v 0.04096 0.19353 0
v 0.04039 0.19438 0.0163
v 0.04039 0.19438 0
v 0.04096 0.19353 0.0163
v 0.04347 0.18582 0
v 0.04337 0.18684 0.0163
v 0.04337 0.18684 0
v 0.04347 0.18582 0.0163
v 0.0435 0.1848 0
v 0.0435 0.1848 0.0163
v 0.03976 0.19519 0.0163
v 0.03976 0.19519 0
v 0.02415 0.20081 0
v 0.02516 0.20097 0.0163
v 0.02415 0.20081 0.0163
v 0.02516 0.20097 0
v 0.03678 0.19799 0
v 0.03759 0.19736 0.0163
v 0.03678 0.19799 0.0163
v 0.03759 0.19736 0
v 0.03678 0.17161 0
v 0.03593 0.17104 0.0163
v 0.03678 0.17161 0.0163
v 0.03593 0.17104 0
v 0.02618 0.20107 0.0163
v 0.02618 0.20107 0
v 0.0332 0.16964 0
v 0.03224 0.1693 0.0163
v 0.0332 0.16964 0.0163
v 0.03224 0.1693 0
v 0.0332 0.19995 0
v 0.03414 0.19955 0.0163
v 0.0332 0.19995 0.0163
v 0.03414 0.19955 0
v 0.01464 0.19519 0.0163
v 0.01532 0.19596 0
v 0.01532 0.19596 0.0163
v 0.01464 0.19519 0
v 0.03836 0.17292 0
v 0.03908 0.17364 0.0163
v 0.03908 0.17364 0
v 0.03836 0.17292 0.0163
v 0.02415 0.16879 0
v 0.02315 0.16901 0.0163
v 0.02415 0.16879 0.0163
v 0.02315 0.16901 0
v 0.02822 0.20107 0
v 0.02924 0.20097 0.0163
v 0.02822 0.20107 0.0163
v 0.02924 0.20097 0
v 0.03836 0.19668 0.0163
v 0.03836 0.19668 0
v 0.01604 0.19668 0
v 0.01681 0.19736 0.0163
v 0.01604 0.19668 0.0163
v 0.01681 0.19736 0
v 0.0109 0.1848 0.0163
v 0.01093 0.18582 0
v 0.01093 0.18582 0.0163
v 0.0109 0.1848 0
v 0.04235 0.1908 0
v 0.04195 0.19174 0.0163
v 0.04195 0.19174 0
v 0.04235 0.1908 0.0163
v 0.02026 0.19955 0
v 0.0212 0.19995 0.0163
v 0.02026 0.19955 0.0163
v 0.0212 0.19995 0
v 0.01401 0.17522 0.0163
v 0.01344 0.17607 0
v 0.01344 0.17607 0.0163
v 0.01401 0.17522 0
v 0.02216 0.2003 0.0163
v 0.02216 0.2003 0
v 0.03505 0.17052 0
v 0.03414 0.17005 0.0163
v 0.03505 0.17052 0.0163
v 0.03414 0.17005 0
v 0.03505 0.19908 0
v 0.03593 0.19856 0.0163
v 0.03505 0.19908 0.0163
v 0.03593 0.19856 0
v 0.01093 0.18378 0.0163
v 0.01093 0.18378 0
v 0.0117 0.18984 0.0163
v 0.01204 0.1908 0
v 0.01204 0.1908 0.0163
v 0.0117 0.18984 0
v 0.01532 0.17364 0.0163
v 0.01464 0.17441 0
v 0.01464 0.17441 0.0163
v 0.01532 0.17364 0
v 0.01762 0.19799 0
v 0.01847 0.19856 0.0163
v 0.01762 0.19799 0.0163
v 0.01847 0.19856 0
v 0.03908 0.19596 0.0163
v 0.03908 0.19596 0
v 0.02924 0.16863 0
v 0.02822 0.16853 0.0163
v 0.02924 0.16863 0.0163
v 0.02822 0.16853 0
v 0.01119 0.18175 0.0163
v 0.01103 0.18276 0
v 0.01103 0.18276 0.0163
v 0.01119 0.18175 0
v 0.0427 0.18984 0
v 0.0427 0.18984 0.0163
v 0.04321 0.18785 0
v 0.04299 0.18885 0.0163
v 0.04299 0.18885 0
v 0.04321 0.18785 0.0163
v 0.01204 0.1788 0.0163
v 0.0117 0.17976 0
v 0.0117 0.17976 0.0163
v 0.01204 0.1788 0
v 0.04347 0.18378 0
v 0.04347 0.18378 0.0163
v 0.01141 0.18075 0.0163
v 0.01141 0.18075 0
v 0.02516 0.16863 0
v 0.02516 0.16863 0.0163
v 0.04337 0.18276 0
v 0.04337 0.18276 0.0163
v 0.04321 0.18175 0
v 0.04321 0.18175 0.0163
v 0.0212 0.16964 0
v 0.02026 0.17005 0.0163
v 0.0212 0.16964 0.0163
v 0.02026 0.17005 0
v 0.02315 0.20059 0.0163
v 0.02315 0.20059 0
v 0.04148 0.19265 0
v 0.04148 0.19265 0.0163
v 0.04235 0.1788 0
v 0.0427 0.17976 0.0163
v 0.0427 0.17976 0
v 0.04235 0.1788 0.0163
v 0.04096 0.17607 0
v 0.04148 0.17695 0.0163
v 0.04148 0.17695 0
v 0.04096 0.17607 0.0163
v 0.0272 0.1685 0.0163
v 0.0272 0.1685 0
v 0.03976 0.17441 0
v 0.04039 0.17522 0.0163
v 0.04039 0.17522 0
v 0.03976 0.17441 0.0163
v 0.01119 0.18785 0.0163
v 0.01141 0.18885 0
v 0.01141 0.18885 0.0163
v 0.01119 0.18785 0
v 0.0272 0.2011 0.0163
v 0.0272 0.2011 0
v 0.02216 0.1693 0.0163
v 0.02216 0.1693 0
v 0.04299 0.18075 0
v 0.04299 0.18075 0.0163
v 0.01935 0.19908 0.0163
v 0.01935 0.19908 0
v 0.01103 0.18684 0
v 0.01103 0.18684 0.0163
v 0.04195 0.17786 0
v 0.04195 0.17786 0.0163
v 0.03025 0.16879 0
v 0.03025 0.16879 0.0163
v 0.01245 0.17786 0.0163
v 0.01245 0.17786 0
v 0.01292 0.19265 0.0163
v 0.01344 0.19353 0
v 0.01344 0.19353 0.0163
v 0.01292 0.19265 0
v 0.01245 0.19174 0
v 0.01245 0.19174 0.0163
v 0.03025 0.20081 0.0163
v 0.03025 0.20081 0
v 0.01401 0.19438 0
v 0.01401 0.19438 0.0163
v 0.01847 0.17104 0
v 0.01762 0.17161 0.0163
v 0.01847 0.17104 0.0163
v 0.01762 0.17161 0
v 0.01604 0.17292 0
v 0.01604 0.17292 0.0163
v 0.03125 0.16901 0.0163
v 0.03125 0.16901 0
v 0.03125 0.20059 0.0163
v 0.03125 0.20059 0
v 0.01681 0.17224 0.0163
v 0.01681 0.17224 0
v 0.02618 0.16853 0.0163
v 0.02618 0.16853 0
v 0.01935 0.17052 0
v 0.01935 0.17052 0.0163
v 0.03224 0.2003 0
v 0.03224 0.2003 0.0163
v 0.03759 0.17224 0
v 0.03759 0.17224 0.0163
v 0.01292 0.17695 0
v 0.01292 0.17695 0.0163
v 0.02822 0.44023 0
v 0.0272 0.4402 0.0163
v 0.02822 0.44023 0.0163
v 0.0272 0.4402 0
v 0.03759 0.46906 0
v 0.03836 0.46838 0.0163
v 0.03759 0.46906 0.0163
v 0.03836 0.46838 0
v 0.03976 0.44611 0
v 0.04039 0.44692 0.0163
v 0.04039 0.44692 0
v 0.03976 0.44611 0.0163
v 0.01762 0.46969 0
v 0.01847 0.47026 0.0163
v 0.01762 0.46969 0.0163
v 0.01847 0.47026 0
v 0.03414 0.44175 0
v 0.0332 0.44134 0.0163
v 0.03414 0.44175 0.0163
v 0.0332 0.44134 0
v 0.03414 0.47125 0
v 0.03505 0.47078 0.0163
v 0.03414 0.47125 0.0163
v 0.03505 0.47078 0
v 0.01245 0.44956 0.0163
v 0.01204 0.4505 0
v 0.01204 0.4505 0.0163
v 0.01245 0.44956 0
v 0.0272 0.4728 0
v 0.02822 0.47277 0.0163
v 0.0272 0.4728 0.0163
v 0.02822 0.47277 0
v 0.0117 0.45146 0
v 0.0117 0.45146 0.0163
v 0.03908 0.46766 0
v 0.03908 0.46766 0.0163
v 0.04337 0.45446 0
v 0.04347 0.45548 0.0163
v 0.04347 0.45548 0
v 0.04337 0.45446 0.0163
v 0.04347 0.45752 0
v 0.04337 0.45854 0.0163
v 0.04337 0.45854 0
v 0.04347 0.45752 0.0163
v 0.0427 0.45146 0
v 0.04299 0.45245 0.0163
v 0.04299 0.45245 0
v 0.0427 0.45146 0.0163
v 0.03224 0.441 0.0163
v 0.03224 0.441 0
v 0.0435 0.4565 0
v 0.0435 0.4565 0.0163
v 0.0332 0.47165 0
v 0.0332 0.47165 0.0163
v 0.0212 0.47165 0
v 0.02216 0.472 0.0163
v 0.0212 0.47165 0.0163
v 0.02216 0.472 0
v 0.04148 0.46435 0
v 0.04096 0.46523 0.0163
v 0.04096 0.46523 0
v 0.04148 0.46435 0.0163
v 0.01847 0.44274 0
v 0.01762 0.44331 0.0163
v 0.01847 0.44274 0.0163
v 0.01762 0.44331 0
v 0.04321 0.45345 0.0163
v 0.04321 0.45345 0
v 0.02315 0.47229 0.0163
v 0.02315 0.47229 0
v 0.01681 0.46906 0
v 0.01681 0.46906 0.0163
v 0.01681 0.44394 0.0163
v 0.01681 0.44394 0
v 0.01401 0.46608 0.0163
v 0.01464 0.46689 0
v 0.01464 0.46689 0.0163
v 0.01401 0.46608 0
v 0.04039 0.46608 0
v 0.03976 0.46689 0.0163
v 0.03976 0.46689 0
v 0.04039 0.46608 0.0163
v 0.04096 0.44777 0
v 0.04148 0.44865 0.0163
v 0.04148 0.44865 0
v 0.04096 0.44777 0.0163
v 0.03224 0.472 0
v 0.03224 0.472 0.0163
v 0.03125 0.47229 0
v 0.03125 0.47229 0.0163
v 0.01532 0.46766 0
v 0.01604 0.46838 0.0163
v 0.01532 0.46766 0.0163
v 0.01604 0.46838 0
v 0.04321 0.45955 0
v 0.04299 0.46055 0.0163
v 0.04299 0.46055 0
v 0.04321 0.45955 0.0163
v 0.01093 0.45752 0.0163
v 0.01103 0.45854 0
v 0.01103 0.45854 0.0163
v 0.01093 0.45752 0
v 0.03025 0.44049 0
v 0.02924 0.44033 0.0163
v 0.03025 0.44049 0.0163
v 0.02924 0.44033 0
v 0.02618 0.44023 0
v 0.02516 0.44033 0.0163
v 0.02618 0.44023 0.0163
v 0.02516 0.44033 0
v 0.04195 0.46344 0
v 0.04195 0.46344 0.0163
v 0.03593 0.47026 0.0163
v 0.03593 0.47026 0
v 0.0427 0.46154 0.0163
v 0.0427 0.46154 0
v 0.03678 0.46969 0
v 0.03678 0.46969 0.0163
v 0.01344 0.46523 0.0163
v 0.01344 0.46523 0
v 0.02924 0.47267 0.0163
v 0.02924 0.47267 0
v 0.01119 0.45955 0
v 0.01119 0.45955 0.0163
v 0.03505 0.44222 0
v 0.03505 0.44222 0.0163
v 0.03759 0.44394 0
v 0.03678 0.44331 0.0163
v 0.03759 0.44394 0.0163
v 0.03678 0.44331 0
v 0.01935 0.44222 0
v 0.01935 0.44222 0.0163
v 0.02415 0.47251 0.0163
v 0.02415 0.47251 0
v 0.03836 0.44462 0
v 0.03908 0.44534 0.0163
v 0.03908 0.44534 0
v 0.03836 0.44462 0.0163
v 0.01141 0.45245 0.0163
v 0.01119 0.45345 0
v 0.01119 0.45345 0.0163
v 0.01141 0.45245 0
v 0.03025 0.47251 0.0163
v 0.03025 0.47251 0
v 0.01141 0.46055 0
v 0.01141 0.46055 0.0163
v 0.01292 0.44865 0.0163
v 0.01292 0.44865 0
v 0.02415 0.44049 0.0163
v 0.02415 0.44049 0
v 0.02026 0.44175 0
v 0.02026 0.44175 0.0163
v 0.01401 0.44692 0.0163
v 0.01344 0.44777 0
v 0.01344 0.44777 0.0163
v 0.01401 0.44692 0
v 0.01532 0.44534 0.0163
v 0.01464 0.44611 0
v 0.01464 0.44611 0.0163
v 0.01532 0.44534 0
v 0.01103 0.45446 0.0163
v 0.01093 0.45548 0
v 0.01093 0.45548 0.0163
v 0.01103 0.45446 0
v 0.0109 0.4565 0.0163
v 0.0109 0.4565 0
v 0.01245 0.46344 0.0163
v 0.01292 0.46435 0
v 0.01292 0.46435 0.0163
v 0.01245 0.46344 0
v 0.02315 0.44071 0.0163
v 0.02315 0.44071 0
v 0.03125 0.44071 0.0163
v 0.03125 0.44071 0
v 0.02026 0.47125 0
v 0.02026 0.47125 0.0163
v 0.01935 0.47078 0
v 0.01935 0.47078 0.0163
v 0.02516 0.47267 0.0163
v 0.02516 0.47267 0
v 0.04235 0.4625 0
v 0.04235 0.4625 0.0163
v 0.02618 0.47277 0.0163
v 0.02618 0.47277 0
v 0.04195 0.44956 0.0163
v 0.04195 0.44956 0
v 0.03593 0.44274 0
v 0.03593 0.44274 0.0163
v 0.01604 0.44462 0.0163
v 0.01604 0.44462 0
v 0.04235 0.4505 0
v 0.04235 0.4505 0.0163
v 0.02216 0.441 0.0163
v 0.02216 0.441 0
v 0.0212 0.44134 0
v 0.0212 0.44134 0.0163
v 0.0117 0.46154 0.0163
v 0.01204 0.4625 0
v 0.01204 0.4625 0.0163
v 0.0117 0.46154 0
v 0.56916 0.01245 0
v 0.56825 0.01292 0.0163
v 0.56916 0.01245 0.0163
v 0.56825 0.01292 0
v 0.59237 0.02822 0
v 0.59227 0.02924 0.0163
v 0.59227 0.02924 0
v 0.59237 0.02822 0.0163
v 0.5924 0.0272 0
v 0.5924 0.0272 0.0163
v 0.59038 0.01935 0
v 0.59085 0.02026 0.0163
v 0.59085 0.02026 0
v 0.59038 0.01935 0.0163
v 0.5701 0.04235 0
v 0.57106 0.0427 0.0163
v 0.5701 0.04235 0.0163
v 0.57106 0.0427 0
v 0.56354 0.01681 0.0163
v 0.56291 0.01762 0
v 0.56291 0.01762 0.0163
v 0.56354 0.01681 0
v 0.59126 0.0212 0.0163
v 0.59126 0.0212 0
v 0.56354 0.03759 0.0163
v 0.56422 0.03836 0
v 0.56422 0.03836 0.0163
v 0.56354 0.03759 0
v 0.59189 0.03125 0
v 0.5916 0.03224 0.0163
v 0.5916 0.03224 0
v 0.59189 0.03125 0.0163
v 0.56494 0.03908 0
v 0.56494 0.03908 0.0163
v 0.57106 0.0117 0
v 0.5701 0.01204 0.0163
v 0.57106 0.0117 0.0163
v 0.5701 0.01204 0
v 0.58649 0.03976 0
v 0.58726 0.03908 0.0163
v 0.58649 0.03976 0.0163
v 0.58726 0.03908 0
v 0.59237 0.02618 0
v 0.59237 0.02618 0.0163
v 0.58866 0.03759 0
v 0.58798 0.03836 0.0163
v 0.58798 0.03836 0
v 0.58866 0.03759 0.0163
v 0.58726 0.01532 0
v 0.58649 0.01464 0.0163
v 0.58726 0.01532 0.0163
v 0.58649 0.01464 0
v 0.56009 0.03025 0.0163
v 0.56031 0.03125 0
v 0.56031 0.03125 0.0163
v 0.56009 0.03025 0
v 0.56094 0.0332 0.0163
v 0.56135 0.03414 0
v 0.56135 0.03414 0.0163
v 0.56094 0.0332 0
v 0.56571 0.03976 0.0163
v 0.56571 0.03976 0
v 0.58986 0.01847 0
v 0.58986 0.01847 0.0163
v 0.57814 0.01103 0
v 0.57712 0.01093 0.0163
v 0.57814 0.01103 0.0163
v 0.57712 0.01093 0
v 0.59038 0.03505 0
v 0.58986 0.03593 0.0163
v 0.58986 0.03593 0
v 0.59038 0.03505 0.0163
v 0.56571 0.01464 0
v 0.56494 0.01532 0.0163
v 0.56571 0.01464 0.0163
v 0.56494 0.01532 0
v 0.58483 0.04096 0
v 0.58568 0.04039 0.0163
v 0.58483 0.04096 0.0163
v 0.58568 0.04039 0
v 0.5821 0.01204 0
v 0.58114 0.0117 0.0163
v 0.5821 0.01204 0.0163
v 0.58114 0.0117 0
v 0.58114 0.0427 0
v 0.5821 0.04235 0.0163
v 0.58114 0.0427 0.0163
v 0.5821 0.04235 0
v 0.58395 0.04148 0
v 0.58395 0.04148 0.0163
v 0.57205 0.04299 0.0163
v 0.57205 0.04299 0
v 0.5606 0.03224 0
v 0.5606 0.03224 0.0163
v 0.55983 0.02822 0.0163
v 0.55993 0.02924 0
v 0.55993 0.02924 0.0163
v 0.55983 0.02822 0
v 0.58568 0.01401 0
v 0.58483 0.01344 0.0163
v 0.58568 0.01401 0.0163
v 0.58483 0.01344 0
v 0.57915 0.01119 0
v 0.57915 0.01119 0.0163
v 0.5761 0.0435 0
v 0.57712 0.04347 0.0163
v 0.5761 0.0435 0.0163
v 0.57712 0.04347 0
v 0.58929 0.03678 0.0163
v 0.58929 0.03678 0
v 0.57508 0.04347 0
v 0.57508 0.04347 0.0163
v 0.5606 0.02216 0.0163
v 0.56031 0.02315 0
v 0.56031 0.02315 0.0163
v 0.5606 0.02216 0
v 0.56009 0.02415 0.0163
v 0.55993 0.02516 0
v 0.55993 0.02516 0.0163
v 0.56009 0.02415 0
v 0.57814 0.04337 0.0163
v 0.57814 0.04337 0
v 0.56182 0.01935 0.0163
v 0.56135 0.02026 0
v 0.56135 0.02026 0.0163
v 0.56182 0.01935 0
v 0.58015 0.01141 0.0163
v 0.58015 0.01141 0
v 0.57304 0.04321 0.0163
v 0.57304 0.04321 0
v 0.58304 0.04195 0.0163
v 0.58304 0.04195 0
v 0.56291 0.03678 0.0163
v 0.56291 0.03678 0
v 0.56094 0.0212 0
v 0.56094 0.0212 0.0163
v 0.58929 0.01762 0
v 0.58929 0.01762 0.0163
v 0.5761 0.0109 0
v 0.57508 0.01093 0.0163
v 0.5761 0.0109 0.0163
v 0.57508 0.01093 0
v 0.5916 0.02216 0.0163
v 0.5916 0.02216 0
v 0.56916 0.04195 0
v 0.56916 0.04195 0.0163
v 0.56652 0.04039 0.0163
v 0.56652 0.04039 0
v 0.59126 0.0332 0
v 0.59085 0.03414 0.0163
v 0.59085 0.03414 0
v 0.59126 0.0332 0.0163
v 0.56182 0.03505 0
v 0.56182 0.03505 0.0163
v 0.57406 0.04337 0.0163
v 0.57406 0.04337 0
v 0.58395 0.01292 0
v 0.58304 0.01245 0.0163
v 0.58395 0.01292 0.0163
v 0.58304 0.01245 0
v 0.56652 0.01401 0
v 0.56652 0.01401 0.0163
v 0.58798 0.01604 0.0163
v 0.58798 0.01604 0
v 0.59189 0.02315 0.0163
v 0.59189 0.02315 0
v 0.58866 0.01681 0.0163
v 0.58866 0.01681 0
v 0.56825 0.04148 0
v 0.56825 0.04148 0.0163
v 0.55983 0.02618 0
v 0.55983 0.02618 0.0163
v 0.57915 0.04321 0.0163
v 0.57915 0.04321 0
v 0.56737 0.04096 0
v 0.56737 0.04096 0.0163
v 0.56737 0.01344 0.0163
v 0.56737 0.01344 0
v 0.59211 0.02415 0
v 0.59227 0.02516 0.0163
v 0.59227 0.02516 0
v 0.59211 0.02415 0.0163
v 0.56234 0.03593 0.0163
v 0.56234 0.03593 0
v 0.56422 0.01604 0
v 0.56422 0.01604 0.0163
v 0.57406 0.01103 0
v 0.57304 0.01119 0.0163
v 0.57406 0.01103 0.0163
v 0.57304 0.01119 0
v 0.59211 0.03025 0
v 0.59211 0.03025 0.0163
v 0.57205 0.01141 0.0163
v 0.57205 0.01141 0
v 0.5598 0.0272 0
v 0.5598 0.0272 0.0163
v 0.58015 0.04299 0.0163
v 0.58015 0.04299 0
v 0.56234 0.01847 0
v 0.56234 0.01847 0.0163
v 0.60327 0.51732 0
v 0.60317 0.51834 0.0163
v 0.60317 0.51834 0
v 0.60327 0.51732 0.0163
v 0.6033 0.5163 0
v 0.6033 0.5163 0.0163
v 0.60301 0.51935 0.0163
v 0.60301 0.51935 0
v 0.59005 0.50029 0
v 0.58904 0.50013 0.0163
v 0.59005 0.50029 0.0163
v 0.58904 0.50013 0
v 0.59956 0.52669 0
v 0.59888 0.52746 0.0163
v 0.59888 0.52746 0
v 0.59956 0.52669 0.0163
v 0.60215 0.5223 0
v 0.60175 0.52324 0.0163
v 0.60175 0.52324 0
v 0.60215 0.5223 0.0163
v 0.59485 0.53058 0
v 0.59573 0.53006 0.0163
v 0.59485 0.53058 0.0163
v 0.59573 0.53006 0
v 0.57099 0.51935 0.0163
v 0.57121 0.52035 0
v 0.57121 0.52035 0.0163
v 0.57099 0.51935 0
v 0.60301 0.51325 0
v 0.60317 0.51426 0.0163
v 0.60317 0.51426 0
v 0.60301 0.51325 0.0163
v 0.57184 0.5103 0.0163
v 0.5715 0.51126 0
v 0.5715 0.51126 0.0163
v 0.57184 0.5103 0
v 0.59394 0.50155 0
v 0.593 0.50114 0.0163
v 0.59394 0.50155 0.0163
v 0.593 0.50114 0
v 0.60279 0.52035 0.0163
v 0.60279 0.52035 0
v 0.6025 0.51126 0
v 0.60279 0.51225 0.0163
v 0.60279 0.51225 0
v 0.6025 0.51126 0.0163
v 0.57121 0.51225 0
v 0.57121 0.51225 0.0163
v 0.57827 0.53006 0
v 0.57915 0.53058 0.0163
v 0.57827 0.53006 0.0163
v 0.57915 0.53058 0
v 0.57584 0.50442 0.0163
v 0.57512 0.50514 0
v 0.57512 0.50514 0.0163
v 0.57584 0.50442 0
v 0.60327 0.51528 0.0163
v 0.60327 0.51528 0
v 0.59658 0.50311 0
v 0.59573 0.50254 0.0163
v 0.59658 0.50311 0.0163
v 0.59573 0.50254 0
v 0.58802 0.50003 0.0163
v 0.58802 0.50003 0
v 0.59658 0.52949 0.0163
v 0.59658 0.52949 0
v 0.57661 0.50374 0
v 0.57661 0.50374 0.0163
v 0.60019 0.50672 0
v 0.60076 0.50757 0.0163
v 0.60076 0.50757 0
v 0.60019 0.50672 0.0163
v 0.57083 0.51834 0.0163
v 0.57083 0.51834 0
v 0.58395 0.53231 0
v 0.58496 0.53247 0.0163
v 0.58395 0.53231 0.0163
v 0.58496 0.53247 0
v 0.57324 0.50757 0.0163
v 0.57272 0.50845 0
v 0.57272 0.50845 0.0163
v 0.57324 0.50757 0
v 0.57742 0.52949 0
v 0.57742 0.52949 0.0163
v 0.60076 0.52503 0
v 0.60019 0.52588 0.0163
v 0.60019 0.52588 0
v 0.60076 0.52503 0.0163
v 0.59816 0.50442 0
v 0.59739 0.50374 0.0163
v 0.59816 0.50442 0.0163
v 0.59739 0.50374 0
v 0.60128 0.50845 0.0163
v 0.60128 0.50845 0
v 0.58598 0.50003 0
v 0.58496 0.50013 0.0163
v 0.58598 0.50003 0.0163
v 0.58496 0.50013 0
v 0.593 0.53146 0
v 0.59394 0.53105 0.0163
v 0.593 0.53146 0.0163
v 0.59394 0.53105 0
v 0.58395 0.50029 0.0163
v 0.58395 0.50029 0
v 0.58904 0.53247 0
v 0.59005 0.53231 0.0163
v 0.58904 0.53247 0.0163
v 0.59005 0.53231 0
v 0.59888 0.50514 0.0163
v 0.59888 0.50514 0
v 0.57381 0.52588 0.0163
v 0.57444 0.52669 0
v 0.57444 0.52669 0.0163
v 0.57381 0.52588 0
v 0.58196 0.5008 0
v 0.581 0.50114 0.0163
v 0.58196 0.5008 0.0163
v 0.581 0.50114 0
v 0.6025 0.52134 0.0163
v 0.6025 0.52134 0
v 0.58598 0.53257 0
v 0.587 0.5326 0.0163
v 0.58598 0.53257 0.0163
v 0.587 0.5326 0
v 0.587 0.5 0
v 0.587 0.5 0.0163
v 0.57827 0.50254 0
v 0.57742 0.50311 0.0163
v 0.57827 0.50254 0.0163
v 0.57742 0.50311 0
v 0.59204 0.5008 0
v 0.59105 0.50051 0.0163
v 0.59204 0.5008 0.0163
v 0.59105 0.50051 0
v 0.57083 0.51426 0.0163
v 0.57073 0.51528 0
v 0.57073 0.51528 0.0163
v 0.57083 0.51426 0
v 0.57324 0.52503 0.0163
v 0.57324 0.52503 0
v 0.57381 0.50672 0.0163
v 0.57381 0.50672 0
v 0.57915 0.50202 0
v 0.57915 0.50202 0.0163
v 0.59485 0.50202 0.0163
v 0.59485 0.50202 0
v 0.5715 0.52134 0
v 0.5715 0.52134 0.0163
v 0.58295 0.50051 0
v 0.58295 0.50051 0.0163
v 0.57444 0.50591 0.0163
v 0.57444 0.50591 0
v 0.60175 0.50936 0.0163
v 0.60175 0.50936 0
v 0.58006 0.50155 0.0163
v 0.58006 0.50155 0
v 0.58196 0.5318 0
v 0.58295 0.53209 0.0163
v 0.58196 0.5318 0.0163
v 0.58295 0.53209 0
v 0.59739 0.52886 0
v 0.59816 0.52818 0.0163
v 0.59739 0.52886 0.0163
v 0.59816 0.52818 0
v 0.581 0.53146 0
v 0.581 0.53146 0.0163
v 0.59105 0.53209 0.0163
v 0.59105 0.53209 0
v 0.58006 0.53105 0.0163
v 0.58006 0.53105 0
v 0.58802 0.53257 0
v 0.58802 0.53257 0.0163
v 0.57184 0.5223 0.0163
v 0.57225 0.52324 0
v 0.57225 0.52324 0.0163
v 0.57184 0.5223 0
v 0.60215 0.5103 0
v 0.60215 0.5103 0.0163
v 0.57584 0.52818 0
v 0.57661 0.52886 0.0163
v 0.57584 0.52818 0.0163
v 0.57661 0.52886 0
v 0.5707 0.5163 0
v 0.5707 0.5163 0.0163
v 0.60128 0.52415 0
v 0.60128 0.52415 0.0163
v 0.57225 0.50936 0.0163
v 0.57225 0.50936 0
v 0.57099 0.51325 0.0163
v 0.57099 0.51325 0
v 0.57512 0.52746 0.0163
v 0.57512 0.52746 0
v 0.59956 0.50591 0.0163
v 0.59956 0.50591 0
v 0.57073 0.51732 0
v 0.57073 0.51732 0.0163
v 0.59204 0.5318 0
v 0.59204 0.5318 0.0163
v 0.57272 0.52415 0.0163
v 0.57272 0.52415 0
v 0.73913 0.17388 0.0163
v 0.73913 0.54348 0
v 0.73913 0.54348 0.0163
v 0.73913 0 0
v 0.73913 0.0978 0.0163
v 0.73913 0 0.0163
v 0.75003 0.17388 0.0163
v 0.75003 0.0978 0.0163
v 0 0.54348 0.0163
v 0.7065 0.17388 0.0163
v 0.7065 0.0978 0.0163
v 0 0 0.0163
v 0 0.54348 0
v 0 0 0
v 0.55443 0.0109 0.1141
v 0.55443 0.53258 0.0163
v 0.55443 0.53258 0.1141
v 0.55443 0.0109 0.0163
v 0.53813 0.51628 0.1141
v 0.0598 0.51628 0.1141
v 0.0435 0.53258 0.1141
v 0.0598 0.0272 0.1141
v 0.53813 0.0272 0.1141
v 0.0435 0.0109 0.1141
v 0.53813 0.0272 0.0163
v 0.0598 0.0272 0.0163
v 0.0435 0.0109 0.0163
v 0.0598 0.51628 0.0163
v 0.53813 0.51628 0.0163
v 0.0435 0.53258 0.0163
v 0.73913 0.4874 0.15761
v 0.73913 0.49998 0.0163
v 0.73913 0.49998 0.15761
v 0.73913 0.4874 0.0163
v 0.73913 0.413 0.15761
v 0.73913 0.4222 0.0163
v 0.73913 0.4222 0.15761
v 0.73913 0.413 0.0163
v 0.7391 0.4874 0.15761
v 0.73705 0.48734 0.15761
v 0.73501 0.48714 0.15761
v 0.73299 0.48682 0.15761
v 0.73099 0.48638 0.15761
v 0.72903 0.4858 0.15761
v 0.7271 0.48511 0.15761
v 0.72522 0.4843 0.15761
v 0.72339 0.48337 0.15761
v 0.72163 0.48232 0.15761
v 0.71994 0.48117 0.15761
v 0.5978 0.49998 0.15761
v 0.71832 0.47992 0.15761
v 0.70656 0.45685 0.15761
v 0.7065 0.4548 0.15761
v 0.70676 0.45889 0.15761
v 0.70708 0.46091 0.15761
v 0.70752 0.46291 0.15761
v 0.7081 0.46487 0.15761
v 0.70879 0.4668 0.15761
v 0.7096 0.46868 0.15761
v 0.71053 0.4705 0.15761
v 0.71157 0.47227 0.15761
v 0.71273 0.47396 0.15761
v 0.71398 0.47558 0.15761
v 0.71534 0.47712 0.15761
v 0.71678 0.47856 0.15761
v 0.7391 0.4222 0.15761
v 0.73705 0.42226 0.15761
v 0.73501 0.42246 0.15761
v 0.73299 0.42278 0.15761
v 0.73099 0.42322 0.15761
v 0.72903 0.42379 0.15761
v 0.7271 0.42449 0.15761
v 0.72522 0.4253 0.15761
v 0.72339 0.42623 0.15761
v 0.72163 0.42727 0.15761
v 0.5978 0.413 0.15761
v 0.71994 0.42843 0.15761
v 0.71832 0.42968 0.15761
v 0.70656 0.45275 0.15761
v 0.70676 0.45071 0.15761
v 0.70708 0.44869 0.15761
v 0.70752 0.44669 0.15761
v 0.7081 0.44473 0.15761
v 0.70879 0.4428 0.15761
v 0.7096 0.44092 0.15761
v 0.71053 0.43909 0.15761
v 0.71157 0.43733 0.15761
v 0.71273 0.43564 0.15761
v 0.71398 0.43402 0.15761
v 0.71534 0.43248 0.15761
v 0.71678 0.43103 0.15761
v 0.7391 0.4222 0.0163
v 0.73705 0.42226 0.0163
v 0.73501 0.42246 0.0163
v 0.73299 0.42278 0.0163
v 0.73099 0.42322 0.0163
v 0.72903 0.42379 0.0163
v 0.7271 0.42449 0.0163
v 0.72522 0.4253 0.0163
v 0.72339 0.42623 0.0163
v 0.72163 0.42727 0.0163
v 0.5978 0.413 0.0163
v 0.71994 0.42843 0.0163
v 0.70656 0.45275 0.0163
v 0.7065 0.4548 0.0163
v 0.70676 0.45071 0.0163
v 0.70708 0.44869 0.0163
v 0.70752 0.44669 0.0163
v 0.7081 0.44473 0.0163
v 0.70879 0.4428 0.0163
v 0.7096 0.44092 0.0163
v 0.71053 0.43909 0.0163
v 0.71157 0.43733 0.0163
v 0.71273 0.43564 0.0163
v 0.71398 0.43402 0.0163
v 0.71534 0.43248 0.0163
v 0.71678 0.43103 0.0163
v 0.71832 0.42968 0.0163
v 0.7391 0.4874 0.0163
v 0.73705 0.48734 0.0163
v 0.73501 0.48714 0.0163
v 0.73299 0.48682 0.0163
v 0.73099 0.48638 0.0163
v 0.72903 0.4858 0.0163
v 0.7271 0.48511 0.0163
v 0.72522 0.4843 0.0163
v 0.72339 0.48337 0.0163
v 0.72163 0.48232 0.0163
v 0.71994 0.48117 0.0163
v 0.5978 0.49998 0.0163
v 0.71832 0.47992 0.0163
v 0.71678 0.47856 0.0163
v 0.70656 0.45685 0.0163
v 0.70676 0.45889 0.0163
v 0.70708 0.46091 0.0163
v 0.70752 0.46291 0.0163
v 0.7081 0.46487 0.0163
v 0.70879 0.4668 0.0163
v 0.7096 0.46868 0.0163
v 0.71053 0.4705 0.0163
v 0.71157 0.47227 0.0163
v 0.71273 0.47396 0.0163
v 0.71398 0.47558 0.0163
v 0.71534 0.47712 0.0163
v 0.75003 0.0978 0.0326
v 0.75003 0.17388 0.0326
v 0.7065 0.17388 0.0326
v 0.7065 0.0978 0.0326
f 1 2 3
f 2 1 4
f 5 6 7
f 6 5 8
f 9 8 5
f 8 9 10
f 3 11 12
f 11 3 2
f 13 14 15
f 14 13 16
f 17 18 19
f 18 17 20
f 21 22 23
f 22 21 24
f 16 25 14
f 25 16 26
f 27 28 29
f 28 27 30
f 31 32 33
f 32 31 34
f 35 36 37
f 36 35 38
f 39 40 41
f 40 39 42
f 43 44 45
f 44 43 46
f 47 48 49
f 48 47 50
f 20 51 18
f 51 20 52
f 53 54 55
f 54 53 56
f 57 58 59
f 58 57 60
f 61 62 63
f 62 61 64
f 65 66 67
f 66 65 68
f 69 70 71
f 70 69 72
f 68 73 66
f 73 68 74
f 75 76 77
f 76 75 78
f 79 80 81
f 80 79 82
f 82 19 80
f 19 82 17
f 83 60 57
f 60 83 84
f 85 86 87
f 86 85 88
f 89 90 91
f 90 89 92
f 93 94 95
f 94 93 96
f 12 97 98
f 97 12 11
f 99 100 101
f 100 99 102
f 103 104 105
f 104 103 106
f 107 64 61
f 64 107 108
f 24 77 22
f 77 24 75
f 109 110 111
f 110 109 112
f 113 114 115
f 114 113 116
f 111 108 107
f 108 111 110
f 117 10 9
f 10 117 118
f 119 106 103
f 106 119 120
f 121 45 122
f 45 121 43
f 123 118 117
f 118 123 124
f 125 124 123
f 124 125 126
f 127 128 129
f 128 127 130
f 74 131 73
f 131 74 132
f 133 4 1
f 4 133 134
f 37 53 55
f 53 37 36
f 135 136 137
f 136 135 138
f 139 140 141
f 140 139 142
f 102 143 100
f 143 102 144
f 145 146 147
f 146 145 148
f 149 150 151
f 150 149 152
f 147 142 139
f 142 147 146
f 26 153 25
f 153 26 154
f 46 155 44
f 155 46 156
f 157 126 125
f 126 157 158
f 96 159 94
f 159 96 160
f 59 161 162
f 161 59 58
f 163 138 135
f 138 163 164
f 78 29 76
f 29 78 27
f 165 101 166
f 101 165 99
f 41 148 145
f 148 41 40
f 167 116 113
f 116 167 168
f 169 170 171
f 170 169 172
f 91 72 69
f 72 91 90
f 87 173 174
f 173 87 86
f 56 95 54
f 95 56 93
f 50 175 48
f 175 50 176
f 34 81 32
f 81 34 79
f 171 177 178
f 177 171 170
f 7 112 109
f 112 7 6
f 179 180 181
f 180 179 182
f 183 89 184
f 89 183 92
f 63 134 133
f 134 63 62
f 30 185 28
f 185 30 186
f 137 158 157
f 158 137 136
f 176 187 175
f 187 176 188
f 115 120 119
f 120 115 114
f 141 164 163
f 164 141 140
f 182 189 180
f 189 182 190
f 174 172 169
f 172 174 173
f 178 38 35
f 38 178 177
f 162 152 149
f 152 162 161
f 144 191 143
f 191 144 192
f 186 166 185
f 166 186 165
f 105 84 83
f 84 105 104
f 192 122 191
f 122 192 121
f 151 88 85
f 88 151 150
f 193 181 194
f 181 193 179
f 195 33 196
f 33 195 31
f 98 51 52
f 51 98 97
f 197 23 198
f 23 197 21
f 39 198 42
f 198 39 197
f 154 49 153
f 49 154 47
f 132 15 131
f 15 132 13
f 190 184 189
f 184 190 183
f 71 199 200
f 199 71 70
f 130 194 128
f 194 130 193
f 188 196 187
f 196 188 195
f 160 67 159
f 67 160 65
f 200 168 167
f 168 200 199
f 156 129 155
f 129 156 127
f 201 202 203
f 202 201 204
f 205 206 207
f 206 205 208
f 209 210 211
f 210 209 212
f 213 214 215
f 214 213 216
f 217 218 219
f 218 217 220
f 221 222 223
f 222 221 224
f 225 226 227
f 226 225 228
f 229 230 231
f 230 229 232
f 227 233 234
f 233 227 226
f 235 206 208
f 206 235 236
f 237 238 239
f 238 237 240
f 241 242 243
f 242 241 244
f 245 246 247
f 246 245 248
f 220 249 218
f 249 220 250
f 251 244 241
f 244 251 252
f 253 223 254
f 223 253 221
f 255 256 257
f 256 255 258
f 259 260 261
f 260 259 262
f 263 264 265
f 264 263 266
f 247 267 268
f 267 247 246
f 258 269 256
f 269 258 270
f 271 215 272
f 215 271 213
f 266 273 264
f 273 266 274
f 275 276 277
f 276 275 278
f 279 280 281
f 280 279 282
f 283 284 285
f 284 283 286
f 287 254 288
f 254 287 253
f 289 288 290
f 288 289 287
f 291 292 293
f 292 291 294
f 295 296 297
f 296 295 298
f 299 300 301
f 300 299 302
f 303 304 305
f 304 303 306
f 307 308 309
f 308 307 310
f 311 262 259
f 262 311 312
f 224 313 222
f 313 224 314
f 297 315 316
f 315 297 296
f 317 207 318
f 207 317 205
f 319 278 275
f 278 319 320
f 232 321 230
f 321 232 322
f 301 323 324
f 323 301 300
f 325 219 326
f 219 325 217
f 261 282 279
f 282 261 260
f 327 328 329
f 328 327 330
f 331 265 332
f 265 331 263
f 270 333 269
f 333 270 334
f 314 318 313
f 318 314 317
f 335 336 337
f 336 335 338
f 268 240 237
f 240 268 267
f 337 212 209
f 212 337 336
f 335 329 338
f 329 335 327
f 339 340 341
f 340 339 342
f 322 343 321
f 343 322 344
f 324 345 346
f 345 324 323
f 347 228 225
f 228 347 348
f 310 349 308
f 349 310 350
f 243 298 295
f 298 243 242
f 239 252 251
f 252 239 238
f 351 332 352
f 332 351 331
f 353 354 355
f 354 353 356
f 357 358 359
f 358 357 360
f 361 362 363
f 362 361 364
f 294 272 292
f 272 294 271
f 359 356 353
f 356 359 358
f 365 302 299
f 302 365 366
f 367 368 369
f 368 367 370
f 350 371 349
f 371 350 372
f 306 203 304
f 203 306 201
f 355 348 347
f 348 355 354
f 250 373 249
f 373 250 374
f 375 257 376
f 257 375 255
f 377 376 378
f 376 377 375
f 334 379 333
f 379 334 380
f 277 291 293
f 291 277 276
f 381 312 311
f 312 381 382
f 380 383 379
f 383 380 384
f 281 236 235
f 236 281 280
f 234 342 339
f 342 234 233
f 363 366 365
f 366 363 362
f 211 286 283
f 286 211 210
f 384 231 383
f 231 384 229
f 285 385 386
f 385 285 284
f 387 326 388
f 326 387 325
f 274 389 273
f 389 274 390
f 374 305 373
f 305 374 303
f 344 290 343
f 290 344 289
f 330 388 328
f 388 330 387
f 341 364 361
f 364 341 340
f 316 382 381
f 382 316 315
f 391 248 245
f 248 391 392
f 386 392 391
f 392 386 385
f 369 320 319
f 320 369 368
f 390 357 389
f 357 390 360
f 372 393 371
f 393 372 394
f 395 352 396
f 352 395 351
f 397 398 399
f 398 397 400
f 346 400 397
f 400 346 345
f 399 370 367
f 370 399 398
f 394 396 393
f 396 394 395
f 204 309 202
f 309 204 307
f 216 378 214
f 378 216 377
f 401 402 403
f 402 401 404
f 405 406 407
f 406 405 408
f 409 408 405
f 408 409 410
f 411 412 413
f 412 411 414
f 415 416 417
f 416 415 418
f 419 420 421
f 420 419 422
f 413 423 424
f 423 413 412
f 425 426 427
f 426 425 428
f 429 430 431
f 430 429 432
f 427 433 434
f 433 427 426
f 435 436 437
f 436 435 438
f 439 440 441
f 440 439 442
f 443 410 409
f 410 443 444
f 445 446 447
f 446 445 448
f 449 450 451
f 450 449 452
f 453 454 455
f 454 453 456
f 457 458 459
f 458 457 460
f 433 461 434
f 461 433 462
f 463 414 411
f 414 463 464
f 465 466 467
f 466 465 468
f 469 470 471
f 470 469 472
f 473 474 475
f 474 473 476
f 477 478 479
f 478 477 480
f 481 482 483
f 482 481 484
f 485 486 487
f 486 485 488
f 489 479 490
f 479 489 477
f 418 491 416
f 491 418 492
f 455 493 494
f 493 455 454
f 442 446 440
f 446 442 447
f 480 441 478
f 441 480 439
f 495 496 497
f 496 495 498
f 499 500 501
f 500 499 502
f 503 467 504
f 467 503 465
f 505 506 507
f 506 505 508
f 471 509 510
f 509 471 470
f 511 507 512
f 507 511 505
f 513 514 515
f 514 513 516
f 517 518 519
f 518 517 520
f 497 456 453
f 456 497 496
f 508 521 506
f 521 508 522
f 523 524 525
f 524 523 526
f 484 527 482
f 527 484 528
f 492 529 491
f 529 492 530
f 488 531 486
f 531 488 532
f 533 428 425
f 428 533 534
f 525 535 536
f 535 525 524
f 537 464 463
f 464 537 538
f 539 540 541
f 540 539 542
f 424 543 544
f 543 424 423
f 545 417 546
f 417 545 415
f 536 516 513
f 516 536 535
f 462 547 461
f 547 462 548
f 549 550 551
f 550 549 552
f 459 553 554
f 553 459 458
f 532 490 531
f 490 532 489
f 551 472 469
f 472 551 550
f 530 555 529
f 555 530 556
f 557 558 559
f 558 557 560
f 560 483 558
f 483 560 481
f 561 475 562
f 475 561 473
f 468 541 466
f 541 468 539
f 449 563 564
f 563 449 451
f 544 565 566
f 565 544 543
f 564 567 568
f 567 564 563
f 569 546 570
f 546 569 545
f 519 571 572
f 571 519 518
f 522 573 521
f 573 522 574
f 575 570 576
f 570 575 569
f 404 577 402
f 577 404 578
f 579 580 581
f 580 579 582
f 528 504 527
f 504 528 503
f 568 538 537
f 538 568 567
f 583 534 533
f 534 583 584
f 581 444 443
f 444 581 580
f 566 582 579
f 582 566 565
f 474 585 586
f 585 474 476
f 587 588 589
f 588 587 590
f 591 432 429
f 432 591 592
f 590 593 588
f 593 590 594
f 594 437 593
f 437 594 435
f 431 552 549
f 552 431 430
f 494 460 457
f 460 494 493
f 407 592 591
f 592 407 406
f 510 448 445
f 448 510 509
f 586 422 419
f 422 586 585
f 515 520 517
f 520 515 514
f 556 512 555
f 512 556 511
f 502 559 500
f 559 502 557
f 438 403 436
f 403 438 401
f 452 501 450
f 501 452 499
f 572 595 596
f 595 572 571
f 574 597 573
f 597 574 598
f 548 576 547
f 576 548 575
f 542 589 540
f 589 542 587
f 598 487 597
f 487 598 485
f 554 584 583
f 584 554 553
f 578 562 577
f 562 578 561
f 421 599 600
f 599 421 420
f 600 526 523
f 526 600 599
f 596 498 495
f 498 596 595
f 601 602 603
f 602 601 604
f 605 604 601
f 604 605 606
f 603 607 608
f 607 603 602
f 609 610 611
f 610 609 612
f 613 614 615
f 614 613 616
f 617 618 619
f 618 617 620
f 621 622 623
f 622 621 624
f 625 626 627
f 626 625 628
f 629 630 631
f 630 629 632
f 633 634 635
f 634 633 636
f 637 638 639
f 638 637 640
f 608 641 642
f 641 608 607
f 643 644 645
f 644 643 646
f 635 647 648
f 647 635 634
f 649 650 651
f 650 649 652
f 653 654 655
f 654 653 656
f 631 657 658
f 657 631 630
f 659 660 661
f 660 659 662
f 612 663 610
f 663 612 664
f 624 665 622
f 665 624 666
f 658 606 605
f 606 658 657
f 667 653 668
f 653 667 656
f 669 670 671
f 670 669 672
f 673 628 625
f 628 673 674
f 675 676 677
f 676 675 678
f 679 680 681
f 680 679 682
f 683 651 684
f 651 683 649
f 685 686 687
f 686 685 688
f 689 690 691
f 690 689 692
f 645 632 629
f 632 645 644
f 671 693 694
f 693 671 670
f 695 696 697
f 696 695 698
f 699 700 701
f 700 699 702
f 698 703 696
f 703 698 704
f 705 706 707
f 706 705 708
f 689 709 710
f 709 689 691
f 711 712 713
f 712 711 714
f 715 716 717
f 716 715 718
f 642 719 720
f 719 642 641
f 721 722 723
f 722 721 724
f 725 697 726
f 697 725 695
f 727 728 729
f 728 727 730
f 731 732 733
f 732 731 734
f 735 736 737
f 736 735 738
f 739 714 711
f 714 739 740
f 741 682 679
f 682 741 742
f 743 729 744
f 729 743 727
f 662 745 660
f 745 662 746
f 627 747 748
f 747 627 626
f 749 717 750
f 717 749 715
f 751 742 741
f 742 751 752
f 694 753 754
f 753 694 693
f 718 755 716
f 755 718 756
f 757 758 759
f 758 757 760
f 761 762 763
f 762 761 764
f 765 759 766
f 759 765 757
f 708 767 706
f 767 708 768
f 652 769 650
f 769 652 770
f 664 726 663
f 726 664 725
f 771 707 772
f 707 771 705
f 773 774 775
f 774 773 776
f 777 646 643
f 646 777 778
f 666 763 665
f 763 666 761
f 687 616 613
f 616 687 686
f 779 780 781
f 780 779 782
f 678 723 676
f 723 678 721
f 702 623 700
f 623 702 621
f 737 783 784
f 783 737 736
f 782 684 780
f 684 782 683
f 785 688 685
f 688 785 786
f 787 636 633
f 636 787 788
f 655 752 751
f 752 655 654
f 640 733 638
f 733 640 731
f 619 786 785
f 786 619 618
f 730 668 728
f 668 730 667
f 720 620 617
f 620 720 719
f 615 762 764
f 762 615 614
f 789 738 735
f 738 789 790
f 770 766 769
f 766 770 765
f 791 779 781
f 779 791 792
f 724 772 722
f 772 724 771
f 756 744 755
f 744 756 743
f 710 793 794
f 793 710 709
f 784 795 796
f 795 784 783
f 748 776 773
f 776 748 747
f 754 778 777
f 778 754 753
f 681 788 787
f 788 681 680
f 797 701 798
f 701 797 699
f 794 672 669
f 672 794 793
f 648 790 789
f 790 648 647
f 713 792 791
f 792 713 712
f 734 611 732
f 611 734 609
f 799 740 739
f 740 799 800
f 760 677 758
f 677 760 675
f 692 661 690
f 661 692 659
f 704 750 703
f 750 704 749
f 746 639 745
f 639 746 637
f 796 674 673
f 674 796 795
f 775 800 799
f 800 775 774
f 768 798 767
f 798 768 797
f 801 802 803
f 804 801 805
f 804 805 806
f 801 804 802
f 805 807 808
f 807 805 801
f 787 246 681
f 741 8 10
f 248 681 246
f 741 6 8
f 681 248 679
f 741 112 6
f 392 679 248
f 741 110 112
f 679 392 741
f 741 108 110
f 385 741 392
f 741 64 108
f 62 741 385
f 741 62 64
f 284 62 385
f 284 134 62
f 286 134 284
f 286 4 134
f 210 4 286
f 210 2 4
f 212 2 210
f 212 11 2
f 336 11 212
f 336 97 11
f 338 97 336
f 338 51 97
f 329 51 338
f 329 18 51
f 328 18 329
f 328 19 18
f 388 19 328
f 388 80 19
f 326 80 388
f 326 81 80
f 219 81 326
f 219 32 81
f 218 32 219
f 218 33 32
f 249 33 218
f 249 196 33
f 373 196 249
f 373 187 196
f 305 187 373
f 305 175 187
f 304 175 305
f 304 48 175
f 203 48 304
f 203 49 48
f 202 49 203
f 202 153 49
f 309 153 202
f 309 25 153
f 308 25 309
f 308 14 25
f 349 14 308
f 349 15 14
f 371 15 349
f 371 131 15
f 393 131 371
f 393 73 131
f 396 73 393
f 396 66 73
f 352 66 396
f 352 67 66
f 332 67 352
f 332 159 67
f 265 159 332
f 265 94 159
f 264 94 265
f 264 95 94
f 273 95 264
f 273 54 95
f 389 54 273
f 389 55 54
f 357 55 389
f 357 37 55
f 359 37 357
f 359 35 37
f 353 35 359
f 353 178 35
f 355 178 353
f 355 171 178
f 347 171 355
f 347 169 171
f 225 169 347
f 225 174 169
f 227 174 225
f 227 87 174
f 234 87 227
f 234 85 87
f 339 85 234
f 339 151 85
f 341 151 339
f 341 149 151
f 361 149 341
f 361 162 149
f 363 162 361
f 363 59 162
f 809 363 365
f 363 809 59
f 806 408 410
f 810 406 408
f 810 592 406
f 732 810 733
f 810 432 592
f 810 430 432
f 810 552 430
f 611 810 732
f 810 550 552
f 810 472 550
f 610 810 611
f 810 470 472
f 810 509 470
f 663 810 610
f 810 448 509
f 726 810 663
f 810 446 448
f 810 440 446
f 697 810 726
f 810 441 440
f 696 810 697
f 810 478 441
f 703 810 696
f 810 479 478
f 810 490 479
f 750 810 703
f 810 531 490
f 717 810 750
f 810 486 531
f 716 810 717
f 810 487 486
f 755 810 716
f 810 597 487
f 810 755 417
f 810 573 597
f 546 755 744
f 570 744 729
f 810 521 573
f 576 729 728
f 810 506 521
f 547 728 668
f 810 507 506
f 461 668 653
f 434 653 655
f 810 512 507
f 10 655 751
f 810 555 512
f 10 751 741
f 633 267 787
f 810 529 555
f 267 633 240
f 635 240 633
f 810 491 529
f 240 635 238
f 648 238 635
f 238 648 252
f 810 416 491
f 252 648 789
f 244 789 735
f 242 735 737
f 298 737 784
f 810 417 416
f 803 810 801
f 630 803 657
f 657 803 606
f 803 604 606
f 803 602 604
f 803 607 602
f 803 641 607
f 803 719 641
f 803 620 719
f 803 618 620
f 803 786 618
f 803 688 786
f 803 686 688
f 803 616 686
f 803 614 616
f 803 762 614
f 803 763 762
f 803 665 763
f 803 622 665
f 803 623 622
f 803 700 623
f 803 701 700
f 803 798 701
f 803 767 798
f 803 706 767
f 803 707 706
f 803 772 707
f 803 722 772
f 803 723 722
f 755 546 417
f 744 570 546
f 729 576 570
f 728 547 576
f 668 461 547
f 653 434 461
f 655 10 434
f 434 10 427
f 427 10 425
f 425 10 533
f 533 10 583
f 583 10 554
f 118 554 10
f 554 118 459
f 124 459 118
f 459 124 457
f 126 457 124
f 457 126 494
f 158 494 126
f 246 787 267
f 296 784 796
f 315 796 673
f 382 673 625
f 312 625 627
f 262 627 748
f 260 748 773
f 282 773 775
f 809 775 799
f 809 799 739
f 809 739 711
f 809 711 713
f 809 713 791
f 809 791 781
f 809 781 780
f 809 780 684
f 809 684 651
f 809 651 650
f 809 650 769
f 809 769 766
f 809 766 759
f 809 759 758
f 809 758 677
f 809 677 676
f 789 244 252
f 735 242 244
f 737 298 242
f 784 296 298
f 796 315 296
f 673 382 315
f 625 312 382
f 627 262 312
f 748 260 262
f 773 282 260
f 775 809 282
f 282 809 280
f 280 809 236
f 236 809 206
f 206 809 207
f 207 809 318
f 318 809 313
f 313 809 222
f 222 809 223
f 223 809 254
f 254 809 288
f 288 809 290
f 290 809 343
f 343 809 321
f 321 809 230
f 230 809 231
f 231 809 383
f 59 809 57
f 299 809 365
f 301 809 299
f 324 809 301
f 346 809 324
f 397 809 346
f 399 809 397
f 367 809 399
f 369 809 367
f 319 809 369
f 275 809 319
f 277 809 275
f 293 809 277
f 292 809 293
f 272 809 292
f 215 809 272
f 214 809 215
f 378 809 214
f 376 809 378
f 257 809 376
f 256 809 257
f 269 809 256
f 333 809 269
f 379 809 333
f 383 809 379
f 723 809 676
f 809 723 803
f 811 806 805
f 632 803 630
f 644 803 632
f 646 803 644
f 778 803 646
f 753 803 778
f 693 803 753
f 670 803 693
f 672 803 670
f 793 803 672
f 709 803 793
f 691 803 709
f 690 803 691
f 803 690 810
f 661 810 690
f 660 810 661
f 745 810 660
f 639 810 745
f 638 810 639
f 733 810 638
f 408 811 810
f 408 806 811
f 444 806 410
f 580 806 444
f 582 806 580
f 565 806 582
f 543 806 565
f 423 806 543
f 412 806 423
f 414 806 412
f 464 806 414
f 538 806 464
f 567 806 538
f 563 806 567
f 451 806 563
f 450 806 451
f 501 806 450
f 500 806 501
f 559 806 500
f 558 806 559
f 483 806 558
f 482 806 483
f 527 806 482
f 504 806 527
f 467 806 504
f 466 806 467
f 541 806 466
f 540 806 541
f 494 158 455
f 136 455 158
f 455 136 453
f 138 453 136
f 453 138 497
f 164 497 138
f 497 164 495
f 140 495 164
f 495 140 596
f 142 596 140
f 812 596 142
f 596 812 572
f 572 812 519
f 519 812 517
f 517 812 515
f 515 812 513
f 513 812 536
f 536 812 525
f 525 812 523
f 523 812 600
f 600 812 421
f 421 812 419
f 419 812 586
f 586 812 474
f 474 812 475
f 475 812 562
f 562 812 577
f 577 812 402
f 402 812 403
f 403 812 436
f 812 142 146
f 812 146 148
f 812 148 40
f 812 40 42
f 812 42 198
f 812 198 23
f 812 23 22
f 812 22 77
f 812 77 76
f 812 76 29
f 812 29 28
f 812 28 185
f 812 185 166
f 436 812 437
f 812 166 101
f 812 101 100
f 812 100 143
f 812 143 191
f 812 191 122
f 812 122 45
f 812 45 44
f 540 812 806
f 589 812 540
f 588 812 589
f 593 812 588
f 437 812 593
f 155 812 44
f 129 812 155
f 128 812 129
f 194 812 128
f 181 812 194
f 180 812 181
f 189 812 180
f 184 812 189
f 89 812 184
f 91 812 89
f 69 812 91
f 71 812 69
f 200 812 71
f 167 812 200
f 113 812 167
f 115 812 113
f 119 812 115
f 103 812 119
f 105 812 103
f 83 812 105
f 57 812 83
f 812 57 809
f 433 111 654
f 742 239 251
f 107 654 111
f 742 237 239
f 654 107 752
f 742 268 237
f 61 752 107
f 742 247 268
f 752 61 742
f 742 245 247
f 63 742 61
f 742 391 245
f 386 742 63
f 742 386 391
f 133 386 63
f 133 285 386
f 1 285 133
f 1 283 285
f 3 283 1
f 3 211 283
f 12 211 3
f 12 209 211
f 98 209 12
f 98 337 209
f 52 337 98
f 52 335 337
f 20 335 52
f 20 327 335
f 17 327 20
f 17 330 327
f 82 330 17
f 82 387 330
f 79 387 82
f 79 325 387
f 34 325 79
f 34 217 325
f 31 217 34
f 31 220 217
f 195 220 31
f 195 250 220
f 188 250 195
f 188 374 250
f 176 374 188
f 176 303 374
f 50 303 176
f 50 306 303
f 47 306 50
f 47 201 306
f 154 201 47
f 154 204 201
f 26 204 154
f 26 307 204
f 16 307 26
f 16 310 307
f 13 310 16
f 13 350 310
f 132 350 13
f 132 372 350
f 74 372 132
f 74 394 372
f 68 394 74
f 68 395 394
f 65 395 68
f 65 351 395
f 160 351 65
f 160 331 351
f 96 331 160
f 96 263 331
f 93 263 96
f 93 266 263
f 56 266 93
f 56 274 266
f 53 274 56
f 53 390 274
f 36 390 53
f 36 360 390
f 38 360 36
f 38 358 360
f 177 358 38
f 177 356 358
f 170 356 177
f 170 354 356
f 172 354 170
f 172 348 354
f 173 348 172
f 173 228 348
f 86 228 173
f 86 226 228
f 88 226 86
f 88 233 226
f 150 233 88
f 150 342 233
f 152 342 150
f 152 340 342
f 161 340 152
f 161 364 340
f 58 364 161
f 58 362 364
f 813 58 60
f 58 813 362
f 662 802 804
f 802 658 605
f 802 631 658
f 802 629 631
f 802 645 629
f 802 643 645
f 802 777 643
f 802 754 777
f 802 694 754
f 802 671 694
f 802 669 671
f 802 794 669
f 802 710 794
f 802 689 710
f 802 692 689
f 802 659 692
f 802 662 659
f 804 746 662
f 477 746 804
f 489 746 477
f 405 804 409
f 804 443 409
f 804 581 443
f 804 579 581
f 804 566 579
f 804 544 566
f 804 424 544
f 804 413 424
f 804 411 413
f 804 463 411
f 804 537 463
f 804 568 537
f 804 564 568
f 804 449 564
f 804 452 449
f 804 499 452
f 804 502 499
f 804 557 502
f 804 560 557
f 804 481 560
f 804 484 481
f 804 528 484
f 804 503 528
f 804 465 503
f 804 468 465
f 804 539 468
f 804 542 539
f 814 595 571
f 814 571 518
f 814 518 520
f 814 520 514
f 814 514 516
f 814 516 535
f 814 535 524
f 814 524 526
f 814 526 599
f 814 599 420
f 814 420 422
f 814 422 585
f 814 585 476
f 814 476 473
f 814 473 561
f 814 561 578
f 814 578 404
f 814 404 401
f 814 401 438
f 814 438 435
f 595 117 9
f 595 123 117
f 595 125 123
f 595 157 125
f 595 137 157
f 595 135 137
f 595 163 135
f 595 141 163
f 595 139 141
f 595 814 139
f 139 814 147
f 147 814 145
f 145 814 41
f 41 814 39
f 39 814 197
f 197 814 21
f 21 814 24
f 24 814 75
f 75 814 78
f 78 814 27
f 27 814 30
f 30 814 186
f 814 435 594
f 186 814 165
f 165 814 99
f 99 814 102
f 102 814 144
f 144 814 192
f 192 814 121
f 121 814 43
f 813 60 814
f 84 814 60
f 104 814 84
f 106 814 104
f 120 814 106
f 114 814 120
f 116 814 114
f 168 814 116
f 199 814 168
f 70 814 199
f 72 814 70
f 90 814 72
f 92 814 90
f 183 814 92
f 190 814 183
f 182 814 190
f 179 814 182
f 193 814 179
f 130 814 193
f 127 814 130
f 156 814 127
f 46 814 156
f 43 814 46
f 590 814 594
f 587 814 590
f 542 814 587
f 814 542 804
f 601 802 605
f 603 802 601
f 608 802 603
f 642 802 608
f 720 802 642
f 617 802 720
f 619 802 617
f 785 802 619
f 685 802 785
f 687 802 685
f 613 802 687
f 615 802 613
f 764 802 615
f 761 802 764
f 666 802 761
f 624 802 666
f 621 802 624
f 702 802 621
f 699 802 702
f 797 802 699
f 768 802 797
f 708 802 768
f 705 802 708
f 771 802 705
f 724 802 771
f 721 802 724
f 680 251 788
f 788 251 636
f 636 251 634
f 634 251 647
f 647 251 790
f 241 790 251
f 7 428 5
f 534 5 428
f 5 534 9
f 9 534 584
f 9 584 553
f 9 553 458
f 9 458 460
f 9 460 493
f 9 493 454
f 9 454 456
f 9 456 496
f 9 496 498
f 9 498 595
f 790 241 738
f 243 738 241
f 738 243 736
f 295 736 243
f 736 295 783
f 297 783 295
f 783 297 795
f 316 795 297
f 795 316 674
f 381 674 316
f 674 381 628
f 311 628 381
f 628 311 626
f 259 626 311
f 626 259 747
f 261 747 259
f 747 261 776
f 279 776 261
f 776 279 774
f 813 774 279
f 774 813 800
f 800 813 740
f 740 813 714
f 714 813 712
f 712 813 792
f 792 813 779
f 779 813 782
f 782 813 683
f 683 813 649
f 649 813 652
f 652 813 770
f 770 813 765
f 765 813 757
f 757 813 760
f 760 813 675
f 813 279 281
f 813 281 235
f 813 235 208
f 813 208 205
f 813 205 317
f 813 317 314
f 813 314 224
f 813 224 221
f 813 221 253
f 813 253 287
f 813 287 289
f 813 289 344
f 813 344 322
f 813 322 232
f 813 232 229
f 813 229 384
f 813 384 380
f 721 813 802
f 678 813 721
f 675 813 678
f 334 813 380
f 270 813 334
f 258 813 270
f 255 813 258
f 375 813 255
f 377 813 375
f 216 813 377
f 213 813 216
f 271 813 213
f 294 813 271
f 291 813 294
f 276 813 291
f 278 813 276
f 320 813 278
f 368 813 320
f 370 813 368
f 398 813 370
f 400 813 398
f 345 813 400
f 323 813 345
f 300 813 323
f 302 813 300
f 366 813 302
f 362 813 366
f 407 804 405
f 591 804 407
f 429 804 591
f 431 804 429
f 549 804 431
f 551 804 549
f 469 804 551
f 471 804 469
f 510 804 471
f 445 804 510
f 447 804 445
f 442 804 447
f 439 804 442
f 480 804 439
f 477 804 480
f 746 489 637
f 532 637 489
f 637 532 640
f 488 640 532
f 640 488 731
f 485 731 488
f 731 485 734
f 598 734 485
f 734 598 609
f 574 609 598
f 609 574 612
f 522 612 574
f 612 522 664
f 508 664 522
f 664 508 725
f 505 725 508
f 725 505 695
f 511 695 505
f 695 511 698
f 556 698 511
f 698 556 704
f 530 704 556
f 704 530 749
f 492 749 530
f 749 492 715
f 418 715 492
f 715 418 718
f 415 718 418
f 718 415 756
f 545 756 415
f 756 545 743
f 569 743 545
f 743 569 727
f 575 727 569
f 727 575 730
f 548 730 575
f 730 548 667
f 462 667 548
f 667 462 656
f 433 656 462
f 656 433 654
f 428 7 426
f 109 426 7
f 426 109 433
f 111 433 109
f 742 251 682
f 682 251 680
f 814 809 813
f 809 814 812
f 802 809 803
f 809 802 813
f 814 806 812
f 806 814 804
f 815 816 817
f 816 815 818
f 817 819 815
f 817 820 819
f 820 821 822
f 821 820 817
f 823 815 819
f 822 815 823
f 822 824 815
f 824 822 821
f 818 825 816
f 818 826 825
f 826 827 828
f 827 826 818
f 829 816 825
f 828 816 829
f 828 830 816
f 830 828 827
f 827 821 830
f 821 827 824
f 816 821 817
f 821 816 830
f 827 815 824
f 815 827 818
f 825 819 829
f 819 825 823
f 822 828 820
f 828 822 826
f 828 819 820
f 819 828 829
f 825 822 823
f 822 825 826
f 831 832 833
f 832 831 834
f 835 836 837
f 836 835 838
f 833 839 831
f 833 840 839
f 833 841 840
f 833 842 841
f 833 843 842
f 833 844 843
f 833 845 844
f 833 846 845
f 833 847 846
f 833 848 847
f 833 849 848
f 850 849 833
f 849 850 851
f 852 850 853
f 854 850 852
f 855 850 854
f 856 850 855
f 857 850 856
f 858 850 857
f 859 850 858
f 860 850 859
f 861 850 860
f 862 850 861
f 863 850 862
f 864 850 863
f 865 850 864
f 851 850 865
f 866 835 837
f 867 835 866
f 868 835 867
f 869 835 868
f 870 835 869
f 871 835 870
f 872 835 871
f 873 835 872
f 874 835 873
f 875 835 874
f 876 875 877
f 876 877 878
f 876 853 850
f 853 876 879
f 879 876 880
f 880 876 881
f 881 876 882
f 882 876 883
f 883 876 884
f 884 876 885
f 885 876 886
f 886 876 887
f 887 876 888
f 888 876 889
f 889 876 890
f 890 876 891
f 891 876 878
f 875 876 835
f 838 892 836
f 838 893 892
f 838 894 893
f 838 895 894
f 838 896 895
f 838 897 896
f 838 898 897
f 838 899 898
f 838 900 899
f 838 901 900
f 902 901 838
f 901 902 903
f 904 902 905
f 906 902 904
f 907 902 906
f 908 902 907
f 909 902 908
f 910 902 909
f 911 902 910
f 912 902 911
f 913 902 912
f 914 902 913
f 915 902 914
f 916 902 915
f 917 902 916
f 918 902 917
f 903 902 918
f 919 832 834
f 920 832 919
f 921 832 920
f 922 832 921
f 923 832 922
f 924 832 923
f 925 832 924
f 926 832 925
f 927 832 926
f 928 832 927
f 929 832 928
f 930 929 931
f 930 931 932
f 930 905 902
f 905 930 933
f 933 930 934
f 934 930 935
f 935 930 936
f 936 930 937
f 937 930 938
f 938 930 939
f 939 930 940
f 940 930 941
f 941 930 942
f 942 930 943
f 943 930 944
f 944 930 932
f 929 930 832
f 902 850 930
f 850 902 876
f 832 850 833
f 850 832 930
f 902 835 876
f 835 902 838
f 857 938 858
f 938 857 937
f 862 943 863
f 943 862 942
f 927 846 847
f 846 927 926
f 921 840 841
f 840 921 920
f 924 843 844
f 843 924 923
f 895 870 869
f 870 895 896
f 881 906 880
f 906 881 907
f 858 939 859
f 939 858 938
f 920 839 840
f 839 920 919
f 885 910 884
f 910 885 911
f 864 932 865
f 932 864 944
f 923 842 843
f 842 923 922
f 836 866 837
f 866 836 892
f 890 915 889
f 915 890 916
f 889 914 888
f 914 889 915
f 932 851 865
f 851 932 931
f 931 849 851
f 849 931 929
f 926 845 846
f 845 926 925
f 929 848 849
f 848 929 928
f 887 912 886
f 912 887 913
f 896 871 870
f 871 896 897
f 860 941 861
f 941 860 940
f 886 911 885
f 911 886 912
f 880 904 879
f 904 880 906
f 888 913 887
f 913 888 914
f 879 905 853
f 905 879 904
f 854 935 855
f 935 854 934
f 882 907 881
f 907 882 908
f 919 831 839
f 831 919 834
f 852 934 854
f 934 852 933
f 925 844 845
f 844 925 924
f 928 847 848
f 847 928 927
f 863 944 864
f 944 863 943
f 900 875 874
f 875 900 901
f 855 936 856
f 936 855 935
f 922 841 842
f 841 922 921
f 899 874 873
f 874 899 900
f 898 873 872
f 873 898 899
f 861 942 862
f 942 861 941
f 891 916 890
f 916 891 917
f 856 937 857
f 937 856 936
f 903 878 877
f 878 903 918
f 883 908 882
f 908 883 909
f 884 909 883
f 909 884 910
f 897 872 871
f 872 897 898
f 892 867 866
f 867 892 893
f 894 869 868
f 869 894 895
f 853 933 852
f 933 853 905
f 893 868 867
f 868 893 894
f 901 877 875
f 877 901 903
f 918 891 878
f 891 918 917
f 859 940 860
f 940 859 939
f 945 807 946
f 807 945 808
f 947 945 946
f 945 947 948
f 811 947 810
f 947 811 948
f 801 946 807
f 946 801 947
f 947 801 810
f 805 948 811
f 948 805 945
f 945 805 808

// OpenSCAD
// === Parametric Variables ===

// Base plate
base_length = 0.73913;
base_width = 0.543478;
base_height = 0.016304;

// Through holes in base plate
hole_radius = 0.0163;
hole1_pos = [0.0272, 0.1848];
hole2_pos = [0.0272, 0.4565];
hole3_pos = [0.5761, 0.0272];
hole4_pos = [0.587, 0.5163];

// Raised rail group (rectangular frame outline)
rail_left_offset = 0.0435;
rail_right_offset = 0.1847;
rail_front_offset = 0.0109;
rail_back_offset = 0.0109;
rail_raise = 0.0978;
rail_wall = 0.0163; // assumed rib wall thickness

// Shallow rectangular tab
tab_left_offset = 0.7065;
tab_right_offset = -0.0109;  // negative = extends beyond base right edge
tab_front_offset = 0.0978;
tab_back_offset = 0.3696;
tab_height = 0.0163;

// Deeper side block
block_left_offset = 0.5978;
block_right_offset = 0;
block_front_offset = 0.413;
block_back_offset = 0.0435;
block_height = 0.141304;

// Hole through deeper block
block_hole_radius = 0.0326;
block_hole_x = 0.7391;
block_hole_y = 0.4548;

$fn = 100;

// === Derived Positions ===
rail_x0 = rail_left_offset;
rail_x1 = base_length - rail_right_offset;
rail_y0 = rail_front_offset;
rail_y1 = base_width - rail_back_offset;

tab_x0 = tab_left_offset;
tab_x1 = base_length - tab_right_offset;
tab_y0 = tab_front_offset;
tab_y1 = base_width - tab_back_offset;

blk_x0 = block_left_offset;
blk_x1 = base_length - block_right_offset;
blk_y0 = block_front_offset;
blk_y1 = base_width - block_back_offset;

// === Main Assembly ===
union() {

    // --- Base plate with four through holes ---
    difference() {
        cube([base_length, base_width, base_height]);

        for (p = [hole1_pos, hole2_pos, hole3_pos, hole4_pos]) {
            translate([p[0], p[1], -0.001])
                cylinder(h=base_height + 0.002, r=hole_radius);
        }
    }

    // --- Raised rail group: rectangular rib outline (frame) ---
    translate([rail_x0, rail_y0, base_height])
    difference() {
        // Outer rectangular profile
        cube([rail_x1 - rail_x0, rail_y1 - rail_y0, rail_raise]);
        // Hollow interior
        translate([rail_wall, rail_wall, -0.001])
            cube([
                rail_x1 - rail_x0 - 2 * rail_wall,
                rail_y1 - rail_y0 - 2 * rail_wall,
                rail_raise + 0.002
            ]);
    }

    // --- Shallow rectangular tab ---
    translate([tab_x0, tab_y0, base_height])
        cube([tab_x1 - tab_x0, tab_y1 - tab_y0, tab_height]);

    // --- Deeper side block with through hole ---
    translate([blk_x0, blk_y0, base_height])
    difference() {
        cube([blk_x1 - blk_x0, blk_y1 - blk_y0, block_height]);
        // Circular through opening in block
        translate([block_hole_x - blk_x0, block_hole_y - blk_y0, -0.001])
            cylinder(h=block_height + 0.002, r=block_hole_radius);
    }

}
